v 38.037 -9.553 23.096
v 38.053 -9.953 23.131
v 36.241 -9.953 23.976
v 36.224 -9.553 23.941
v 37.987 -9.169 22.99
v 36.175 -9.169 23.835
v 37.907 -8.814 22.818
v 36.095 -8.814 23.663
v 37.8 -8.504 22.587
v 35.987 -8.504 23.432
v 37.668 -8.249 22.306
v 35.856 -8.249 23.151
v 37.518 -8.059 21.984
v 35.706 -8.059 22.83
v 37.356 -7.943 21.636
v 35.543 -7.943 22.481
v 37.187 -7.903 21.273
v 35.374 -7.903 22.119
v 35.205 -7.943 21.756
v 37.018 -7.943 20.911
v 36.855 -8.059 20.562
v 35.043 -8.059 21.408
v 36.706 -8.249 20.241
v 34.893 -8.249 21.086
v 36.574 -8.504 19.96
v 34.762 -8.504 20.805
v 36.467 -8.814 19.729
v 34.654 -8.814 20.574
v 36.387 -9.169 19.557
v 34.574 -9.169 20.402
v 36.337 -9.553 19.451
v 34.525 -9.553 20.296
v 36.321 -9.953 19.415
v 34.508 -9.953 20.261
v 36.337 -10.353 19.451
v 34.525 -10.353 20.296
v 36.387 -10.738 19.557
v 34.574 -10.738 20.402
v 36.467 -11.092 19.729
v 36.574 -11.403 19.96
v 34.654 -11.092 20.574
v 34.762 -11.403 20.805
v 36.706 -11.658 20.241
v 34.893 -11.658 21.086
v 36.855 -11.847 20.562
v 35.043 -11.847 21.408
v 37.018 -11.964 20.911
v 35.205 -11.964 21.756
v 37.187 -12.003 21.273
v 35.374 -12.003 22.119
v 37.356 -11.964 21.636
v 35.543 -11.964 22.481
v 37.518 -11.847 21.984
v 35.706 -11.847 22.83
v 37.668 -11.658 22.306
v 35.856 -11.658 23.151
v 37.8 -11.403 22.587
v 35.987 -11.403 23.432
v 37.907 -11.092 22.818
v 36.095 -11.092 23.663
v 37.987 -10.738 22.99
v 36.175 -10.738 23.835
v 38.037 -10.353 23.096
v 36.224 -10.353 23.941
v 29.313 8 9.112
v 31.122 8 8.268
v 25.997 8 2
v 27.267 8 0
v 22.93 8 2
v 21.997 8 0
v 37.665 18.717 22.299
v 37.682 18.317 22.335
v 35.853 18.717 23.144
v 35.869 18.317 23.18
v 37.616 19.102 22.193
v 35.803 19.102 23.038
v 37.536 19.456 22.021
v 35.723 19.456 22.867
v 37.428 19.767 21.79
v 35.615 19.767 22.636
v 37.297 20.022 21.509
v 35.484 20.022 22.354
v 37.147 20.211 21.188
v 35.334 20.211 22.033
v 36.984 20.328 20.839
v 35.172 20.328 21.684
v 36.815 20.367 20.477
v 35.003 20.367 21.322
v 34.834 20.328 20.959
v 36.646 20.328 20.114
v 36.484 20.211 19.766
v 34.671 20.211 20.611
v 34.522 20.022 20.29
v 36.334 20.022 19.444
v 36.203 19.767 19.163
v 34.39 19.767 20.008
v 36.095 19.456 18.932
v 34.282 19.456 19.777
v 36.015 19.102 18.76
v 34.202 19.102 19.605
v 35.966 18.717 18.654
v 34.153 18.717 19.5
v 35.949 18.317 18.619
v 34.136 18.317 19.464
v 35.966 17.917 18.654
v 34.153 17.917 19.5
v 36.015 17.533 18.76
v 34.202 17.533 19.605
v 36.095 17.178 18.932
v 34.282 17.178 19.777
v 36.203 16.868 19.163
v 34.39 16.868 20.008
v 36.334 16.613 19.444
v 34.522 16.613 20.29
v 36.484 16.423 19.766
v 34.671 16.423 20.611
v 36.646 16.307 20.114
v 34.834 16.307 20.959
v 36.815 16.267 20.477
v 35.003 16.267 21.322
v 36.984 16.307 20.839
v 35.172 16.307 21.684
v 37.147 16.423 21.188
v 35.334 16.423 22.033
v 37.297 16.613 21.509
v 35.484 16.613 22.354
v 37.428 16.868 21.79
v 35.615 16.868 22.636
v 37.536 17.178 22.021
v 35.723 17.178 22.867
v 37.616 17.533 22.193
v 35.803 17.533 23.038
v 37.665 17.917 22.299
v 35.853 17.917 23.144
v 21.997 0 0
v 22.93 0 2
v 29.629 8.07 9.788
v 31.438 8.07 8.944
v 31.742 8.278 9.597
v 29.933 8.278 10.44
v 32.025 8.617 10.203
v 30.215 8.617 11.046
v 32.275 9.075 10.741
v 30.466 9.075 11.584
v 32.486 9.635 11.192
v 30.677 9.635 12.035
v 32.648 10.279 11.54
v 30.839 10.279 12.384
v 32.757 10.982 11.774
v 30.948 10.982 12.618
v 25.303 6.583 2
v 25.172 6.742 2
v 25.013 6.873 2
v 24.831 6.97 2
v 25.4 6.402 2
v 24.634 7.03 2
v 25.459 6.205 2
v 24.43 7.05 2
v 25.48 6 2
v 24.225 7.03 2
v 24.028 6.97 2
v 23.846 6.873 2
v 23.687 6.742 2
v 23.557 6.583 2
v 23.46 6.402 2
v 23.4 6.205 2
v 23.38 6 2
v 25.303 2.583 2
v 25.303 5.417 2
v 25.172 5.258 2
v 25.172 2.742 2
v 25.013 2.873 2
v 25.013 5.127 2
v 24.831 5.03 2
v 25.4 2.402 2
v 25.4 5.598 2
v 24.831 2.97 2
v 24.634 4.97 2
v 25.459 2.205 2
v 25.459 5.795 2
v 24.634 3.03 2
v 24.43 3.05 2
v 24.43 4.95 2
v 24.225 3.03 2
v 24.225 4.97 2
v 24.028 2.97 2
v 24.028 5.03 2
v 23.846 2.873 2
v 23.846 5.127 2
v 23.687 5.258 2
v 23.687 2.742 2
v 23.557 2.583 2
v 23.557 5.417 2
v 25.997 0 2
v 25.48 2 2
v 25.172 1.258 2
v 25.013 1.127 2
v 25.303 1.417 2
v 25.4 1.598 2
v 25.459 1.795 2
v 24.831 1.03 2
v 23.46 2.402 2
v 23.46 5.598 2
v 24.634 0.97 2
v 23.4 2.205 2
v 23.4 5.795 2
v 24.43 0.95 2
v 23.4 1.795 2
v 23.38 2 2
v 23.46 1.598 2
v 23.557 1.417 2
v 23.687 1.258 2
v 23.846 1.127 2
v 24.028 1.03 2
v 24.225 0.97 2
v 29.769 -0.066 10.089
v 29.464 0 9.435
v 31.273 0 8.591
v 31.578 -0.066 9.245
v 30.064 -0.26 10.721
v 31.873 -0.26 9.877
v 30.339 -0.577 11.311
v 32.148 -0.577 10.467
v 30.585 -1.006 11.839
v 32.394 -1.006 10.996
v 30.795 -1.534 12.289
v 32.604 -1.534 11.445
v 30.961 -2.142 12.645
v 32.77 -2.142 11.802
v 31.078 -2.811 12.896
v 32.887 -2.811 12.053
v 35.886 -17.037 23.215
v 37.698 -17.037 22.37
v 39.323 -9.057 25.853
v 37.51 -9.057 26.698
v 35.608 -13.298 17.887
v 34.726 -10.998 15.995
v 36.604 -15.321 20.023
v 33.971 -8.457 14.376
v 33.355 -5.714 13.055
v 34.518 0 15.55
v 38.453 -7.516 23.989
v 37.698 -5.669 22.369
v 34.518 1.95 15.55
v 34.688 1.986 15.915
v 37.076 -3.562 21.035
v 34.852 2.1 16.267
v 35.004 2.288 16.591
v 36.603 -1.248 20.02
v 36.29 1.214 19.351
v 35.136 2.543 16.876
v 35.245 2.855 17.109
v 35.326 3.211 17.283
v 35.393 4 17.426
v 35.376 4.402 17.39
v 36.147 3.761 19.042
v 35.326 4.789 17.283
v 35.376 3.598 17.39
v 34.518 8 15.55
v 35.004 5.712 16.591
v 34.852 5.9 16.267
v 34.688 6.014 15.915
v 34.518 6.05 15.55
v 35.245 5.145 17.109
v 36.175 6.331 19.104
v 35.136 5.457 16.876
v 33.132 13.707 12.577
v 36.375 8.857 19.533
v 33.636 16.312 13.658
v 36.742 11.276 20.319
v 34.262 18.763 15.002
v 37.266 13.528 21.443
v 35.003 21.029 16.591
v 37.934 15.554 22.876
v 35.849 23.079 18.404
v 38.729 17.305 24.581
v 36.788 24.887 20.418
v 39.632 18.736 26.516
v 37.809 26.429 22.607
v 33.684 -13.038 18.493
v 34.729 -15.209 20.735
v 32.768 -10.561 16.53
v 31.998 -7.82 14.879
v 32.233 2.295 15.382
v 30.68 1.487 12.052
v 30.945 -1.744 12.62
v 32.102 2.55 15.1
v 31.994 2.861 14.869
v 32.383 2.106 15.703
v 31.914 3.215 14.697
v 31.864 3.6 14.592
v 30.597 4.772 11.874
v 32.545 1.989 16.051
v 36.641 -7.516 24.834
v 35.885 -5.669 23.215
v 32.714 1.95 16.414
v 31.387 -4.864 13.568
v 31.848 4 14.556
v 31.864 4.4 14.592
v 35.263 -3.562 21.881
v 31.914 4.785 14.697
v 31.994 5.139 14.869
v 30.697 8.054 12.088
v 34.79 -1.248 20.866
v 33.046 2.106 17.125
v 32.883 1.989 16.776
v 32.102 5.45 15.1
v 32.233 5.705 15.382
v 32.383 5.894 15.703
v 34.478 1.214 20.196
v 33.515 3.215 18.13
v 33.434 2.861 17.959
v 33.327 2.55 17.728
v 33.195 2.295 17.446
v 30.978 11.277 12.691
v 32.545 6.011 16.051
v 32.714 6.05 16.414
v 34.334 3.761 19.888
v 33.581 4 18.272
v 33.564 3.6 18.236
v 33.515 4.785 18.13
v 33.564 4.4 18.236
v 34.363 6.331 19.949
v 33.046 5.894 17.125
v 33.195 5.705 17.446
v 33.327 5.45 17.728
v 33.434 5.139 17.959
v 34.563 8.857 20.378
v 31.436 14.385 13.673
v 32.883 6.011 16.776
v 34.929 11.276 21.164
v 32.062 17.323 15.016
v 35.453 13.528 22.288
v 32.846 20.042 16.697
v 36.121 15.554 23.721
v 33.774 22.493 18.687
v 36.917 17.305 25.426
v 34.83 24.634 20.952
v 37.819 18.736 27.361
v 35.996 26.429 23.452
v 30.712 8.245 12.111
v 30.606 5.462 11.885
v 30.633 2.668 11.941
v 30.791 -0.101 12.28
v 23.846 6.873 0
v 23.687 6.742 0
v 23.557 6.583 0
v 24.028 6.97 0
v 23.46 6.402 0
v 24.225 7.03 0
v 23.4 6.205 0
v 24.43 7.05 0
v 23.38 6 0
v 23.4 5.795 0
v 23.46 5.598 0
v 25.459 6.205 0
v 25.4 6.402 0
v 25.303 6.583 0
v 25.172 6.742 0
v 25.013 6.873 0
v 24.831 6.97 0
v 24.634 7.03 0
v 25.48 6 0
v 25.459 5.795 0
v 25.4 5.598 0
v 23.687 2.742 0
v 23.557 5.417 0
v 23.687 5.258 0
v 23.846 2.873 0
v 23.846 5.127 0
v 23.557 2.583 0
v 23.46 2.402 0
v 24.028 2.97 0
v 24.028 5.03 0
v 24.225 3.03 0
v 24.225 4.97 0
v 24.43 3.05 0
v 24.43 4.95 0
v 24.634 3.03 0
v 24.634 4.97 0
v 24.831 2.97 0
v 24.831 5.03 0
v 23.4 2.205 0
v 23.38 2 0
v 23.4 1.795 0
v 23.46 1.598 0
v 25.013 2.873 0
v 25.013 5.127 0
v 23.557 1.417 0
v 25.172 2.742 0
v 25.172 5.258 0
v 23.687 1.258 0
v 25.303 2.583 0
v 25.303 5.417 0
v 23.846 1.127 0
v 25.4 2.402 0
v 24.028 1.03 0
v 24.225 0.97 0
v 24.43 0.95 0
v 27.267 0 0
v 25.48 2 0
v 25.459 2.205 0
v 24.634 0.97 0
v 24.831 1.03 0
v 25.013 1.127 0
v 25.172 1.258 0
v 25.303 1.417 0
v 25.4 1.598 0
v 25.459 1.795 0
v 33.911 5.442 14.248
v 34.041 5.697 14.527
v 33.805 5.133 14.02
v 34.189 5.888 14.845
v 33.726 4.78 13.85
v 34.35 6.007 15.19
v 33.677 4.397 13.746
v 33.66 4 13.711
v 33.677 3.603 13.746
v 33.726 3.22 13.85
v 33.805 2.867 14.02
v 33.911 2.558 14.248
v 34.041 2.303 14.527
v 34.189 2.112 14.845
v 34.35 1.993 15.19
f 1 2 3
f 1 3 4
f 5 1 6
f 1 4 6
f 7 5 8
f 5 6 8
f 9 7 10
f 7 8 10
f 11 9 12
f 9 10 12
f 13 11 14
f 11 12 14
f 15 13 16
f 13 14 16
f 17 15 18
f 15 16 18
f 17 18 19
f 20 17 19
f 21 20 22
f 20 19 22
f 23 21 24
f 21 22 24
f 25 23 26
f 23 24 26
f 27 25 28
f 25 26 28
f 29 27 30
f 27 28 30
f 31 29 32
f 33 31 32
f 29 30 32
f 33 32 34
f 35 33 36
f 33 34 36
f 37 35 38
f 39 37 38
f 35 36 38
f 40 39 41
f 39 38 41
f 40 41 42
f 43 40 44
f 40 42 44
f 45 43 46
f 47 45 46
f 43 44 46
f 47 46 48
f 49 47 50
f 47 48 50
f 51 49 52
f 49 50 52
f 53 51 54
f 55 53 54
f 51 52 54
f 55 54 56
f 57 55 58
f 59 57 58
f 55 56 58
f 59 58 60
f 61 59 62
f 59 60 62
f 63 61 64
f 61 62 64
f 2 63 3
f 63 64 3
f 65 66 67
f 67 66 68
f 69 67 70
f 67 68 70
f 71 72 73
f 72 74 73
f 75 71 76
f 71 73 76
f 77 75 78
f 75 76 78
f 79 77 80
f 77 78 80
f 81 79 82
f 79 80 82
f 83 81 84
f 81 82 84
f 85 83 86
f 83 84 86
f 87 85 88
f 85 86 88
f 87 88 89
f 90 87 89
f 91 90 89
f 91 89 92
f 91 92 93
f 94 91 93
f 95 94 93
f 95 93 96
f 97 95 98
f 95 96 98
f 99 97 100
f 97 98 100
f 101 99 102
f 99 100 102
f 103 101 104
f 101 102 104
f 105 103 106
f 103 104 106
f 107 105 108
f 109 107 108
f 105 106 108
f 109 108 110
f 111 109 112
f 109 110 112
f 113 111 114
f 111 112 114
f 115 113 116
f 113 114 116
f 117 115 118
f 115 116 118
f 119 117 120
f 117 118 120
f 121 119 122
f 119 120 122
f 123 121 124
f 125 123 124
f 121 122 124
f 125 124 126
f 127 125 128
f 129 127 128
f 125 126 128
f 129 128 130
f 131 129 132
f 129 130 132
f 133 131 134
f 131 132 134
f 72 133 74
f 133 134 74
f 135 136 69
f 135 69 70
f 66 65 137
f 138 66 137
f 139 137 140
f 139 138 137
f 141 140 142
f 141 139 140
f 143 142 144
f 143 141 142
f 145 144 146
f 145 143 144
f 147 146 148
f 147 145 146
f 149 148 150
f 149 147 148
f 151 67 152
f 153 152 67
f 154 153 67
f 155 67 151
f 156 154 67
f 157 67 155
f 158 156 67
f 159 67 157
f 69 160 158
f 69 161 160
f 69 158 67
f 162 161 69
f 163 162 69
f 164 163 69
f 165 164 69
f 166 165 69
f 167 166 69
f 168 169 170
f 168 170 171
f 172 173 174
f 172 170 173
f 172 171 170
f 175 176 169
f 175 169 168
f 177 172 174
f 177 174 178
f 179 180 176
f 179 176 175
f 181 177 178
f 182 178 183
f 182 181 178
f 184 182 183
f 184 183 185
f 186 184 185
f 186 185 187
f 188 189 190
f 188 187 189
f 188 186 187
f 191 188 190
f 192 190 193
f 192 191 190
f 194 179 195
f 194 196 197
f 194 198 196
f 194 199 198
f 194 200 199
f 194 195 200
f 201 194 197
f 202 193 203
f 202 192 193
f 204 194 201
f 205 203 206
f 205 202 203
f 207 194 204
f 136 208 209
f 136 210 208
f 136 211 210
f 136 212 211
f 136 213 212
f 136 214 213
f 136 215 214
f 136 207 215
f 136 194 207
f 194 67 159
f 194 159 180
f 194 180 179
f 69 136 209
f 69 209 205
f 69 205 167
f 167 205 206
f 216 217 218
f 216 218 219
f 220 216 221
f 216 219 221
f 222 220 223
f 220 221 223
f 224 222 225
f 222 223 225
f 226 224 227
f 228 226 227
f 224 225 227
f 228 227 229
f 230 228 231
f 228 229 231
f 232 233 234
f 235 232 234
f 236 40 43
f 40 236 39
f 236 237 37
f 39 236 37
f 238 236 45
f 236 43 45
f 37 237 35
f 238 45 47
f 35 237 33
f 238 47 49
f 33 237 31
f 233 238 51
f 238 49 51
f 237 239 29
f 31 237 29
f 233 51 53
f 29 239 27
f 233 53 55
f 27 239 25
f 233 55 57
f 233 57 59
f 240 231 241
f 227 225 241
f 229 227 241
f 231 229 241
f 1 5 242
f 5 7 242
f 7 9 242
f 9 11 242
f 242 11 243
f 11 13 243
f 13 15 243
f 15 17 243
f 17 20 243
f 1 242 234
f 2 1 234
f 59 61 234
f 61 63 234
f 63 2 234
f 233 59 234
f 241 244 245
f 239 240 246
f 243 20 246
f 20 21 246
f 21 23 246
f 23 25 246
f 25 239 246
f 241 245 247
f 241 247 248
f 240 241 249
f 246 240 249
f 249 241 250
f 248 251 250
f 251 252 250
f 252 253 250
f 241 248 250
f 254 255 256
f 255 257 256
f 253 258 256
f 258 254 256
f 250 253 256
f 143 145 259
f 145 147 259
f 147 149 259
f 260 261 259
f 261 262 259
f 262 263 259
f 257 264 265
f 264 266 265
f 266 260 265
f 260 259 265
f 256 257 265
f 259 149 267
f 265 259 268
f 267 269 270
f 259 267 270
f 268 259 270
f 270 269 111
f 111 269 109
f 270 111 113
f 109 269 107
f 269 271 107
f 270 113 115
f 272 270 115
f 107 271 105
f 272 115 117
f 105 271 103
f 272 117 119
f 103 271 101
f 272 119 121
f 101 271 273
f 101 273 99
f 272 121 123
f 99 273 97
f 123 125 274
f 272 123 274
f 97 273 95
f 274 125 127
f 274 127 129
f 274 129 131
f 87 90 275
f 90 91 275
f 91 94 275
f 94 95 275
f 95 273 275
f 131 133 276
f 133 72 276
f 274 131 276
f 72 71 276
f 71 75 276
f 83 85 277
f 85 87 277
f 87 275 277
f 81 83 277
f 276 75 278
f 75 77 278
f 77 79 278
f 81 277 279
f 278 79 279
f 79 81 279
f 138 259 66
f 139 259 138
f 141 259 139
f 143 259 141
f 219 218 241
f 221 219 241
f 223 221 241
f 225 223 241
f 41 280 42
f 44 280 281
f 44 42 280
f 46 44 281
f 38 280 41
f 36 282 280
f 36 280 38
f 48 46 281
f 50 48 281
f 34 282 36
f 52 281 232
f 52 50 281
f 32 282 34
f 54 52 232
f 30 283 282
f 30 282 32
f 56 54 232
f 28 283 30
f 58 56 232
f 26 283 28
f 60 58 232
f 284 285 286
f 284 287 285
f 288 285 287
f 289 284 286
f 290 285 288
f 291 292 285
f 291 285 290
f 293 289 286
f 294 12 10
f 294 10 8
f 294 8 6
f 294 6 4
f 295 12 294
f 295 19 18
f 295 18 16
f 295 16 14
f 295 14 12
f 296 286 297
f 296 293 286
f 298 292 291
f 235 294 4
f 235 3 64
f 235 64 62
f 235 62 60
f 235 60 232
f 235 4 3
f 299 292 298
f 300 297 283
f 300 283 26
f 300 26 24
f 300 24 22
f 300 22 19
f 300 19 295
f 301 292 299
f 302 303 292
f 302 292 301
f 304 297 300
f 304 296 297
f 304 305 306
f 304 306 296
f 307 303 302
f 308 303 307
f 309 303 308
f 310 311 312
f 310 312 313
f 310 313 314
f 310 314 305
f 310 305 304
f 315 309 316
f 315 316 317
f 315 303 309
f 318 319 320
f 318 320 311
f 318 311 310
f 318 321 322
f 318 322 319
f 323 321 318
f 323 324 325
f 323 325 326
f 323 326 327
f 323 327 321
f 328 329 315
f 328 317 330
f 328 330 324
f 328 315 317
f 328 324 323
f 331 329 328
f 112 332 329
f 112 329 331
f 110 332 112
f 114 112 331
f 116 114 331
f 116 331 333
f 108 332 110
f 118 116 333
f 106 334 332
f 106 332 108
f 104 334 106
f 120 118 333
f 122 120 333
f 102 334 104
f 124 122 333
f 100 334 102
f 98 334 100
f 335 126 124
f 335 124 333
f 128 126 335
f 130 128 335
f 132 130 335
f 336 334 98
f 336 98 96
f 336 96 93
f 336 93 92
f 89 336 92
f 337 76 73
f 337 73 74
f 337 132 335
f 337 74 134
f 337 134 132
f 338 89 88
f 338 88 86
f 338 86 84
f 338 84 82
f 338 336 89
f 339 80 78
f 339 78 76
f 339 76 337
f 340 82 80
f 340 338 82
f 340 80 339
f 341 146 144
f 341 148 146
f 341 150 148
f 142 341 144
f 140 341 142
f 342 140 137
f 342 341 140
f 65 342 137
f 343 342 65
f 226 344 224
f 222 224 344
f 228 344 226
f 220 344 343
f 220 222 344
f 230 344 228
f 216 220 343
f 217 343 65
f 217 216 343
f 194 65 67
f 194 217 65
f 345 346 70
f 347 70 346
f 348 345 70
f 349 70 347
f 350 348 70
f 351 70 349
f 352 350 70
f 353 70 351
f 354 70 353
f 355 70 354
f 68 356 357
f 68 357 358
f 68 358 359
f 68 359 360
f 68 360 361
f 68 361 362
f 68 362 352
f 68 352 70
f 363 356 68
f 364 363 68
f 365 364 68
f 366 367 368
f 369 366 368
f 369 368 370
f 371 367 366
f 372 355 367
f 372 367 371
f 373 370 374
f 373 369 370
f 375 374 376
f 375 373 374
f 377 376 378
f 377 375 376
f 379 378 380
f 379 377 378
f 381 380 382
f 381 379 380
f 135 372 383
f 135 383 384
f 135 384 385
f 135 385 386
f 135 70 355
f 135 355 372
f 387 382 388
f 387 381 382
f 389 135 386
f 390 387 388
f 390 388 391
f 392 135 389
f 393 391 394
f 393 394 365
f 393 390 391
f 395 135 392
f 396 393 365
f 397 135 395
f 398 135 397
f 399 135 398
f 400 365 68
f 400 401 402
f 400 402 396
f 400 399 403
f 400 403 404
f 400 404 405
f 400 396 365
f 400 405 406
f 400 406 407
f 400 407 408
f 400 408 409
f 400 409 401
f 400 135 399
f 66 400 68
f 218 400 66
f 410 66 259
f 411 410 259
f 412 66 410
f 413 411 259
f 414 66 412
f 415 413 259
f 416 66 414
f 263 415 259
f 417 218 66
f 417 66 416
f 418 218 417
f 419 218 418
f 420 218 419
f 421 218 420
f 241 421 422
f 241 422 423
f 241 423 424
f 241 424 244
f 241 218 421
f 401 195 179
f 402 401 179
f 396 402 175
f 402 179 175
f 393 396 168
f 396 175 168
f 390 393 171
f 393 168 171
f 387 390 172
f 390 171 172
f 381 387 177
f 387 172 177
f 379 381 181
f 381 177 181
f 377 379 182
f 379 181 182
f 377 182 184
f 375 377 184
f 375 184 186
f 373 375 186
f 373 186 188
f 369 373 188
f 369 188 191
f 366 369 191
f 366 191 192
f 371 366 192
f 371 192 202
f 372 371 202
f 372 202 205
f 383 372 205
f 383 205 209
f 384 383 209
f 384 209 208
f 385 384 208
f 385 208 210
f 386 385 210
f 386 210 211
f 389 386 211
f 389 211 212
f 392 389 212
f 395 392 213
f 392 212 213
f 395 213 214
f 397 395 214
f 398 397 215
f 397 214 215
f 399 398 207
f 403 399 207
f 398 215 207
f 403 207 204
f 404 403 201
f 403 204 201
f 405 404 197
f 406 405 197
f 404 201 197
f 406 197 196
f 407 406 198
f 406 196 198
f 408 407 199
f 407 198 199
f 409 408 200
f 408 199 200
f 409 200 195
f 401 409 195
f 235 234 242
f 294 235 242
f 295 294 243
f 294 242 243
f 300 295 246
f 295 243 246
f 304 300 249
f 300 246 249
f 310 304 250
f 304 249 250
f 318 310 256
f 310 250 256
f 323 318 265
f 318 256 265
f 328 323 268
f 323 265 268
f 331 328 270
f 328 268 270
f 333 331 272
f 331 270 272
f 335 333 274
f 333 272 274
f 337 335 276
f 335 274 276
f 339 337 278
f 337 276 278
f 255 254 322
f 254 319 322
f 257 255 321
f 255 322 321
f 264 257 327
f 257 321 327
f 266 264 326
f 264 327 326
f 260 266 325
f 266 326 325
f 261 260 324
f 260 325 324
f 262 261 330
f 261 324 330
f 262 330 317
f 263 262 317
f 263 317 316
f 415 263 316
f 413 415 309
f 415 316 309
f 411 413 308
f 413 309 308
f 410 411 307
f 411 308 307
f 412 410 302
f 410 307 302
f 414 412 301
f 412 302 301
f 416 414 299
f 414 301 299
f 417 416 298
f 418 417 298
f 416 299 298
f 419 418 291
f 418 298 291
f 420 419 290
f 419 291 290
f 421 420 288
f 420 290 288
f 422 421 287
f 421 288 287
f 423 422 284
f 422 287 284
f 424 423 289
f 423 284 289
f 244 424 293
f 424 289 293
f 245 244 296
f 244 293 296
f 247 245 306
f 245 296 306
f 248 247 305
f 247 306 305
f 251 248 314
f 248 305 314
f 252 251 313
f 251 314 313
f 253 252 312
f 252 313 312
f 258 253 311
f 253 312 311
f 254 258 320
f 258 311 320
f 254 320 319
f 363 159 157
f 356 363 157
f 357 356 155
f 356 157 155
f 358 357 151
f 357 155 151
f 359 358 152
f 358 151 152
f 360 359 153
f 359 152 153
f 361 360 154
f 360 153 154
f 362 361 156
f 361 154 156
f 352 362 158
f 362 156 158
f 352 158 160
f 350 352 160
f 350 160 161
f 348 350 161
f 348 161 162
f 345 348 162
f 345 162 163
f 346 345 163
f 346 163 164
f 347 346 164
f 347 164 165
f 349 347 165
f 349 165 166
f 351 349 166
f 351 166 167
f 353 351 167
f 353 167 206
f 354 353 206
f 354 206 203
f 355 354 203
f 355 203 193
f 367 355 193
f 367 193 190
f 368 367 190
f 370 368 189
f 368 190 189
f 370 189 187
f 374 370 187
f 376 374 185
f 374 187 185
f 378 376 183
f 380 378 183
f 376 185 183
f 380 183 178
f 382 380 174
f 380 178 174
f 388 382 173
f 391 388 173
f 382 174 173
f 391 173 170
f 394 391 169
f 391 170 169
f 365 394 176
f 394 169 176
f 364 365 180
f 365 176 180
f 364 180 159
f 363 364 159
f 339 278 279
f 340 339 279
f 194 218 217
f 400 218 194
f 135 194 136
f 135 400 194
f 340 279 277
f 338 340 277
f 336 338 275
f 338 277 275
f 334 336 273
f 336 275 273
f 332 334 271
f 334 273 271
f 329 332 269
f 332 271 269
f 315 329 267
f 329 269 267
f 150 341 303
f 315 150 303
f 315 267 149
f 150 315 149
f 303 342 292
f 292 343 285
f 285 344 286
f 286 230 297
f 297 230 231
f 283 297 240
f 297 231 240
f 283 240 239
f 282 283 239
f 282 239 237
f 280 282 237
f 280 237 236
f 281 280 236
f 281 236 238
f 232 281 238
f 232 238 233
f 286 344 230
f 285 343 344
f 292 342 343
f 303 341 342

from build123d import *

# Parameters (mm, degrees)
BOSS_EXTRUDE1_DEPTH     = 8
BOSS_EXTRUDE2_DEPTH     = 2
SKETCH3_R               = 2.05
CUT_EXTRUDE3_DEPTH      = 10
CUT_EXTRUDE3_DEPTH_BACK = 10
FILLET2_R               = 4
SKETCH6_R               = 1.05
CUT_EXTRUDE4_DEPTH      = 3


with BuildPart() as part:
    # Sketch1 → Boss-Extrude1 (new body)
    with BuildSketch(Plane(origin=(0, 0, 0), x_dir=(1, 0, 0), z_dir=(0, 1, 0))):
        Polygon((34.518104392, -15.549979118), (32.760161227, -16.503727422), (25.996962058, -2), (22.929577374, -2), (21.996962058, 0), (27.267030045, 0), align=None)
    extrude(amount=BOSS_EXTRUDE1_DEPTH)

    # Sketch5 → Boss-Extrude2 (add)
    with BuildSketch(Plane(origin=(22.396969556, 0, -10.443878423), x_dir=(-0.422618262, 0, -0.906307787), z_dir=(0.906307787, 0, -0.422618262))):
        with BuildLine():
            Line((-40.780850255, 18.736062391), (-36.467218683, 26.428860828))
            ThreePointArc((-36.467218683, 26.428860828), (-23.692308478, 4.771999965), (-36.205658542, -17.037035395))
            Line((-36.205658542, -17.037035395), (-40.049339329, -9.057253488))
            ThreePointArc((-40.049339329, -9.057253488), (-32.517126315, 5.047276383), (-40.780850255, 18.736062391))
        make_face()
    extrude(amount=-BOSS_EXTRUDE2_DEPTH)

    # Sketch3 → Cut-Extrude3 (cut, two sides)
    with BuildSketch(Plane(origin=(20.587699136, 0, -9.600201771), x_dir=(0.422618262, 0, 0.906307787), z_dir=(-0.906307787, 0, 0.422618262))) as cut_extrude3_sk:
        with Locations((28.701516689, 4)):
            Circle(SKETCH3_R)
        with Locations((34.117040182, 18.317355913)):
            Circle(SKETCH3_R)
        with Locations((48.070293023, 24.611901983)):
            Circle(SKETCH3_R)
        with Locations((62.387648936, 19.19637849)):
            Circle(SKETCH3_R)
        with Locations((68.682195005, 5.243125649)):
            Circle(SKETCH3_R)
        with Locations((63.266671512, -9.074230264)):
            Circle(SKETCH3_R)
        with Locations((49.313418672, -15.368776333)):
            Circle(SKETCH3_R)
        with Locations((34.996062759, -9.953252841)):
            Circle(SKETCH3_R)
    extrude(amount=CUT_EXTRUDE3_DEPTH, mode=Mode.SUBTRACT)
    extrude(cut_extrude3_sk.sketch, amount=-CUT_EXTRUDE3_DEPTH_BACK, mode=Mode.SUBTRACT)

    # Fillet2
    fillet2_edges = [part.edges().sort_by_distance(p)[0] for p in [
        (31.687047343, 0, 11.840592477),
        (31.60186373, 8, 11.657915631),
    ]]
    fillet(fillet2_edges, radius=FILLET2_R)

    # Sketch6 → Cut-Extrude4 (cut, through all)
    with BuildSketch(Plane.XY.offset(2)):
        with Locations((24.429577374, 6)):
            Circle(SKETCH6_R)
        with Locations((24.429577374, 2)):
            Circle(SKETCH6_R)
    extrude(amount=-CUT_EXTRUDE4_DEPTH, mode=Mode.SUBTRACT)


solid = part.part
